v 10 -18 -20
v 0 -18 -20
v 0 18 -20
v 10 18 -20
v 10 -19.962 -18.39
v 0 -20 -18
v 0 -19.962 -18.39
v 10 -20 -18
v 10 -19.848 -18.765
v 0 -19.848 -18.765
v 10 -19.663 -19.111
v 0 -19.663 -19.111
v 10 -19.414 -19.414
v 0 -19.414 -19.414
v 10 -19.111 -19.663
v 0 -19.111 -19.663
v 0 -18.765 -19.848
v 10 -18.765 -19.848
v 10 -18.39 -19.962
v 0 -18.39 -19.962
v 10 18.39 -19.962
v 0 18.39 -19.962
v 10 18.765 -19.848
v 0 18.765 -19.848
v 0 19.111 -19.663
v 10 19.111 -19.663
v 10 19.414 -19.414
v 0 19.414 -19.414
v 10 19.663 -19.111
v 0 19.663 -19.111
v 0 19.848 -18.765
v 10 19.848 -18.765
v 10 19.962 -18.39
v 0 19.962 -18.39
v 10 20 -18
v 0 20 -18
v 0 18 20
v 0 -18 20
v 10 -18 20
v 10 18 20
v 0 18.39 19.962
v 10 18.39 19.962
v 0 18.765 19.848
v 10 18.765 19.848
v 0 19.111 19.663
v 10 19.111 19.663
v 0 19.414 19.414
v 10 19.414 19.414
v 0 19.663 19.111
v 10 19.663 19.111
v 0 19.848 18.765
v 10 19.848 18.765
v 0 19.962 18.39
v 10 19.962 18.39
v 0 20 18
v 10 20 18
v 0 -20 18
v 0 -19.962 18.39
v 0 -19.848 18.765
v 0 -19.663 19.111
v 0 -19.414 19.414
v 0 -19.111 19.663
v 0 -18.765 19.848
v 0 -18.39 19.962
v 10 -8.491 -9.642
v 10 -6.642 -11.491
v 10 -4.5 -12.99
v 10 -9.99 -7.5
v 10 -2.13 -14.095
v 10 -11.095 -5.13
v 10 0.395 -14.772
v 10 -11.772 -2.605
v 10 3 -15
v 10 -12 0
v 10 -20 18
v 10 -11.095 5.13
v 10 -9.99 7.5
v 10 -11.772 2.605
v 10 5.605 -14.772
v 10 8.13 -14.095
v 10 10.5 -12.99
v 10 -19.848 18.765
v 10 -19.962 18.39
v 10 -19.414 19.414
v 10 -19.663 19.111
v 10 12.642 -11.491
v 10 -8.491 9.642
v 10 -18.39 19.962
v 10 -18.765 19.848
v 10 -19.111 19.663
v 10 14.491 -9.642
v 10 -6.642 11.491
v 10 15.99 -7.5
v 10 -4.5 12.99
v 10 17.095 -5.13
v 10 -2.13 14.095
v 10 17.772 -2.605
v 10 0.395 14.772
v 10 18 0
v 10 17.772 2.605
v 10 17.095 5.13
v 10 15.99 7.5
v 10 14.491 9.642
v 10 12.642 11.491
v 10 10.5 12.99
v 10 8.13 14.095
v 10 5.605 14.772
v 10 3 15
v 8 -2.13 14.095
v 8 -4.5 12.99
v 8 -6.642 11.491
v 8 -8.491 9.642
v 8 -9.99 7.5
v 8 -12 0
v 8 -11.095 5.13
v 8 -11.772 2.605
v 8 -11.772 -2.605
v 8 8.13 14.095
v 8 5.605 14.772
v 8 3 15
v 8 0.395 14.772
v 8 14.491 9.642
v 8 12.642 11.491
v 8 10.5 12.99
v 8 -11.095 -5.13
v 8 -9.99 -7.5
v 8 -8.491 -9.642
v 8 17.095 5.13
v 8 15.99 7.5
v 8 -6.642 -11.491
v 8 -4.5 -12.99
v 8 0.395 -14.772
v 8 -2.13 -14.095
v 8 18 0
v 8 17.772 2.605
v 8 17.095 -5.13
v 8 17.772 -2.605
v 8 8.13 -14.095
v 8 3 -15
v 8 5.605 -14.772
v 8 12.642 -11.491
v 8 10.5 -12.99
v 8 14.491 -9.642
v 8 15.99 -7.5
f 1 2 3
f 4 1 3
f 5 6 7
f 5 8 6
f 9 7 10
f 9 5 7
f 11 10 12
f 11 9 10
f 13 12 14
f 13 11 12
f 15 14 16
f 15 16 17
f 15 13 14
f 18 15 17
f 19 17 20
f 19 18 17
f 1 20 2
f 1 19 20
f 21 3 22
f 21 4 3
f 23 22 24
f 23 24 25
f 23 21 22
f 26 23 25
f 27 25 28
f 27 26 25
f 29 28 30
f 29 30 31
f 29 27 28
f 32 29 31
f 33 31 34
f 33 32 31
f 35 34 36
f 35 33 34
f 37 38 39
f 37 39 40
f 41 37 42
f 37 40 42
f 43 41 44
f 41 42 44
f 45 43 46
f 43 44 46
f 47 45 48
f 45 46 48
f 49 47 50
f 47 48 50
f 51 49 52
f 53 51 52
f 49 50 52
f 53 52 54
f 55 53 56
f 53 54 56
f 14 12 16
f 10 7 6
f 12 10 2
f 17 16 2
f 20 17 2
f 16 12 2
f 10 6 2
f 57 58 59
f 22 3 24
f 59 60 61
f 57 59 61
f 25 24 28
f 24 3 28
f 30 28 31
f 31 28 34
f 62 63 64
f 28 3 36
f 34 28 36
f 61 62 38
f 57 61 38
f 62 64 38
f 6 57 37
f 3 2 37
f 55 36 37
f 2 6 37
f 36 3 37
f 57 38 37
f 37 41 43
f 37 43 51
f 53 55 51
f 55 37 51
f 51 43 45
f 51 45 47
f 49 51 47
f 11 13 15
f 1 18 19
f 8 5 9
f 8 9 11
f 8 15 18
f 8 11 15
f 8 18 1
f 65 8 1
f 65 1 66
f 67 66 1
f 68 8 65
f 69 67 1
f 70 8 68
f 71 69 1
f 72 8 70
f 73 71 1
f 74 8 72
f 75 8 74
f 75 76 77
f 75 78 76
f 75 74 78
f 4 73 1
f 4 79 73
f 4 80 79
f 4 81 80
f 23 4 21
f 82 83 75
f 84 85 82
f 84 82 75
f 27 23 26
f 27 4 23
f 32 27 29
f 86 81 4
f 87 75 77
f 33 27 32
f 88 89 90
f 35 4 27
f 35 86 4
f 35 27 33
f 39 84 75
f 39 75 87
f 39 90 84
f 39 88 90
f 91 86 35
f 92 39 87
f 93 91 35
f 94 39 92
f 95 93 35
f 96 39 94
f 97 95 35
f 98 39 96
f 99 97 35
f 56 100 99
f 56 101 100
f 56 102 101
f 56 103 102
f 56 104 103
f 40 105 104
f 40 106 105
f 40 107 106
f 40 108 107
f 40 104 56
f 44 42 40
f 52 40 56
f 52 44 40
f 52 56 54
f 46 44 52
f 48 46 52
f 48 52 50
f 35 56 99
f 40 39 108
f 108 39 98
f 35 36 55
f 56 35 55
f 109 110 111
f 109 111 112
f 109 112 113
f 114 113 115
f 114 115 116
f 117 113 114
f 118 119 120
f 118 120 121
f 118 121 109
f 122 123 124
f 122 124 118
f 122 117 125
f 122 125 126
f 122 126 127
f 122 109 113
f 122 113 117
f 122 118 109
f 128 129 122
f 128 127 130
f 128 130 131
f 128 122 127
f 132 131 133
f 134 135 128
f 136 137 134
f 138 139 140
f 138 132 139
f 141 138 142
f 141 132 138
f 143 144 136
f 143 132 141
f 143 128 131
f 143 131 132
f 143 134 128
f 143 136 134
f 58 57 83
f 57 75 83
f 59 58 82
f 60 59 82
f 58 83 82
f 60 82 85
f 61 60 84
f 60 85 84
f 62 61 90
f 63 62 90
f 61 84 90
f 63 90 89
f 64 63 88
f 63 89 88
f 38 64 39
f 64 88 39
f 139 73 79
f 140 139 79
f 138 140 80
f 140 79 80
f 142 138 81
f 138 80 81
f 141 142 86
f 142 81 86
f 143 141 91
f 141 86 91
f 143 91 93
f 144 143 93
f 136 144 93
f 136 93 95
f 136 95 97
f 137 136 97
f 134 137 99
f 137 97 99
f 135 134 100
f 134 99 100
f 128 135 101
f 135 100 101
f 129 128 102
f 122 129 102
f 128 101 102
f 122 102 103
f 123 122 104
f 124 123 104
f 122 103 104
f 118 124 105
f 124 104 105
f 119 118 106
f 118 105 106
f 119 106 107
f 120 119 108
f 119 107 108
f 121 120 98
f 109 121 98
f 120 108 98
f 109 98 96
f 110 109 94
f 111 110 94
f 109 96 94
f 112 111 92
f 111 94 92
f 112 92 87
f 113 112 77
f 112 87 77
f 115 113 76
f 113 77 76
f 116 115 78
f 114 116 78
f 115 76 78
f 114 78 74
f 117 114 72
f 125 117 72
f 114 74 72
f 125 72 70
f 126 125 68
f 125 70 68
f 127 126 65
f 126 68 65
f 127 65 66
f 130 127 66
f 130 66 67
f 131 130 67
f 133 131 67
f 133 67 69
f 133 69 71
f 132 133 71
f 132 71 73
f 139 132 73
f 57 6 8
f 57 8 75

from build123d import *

# Parameters (mm, degrees)
SKETCH1_W           = 40
SKETCH1_H           = 40
BOSS_EXTRUDE1_DEPTH = 10
SKETCH2_R           = 15
CUT_EXTRUDE1_DEPTH  = 2
FILLET1_R           = 2


with BuildPart() as part:
    # Sketch1 → Boss-Extrude1 (new body)
    with BuildSketch(Plane.YZ):
        Rectangle(SKETCH1_W, SKETCH1_H)
    extrude(amount=BOSS_EXTRUDE1_DEPTH)

    # Sketch2 → Cut-Extrude1 (cut)
    with BuildSketch(Plane.YZ.offset(10)):
        with Locations(Location((3, 0, 0), (0, 0, 270))):
            Circle(SKETCH2_R)
    extrude(amount=-CUT_EXTRUDE1_DEPTH, mode=Mode.SUBTRACT)

    # Fillet1
    fillet1_edges = [part.edges().sort_by_distance(p)[0] for p in [
        (5, 20, -20),
        (5, -20, -20),
        (5, -20, 20),
        (5, 20, 20),
    ]]
    fillet(fillet1_edges, radius=FILLET1_R)


solid = part.part
